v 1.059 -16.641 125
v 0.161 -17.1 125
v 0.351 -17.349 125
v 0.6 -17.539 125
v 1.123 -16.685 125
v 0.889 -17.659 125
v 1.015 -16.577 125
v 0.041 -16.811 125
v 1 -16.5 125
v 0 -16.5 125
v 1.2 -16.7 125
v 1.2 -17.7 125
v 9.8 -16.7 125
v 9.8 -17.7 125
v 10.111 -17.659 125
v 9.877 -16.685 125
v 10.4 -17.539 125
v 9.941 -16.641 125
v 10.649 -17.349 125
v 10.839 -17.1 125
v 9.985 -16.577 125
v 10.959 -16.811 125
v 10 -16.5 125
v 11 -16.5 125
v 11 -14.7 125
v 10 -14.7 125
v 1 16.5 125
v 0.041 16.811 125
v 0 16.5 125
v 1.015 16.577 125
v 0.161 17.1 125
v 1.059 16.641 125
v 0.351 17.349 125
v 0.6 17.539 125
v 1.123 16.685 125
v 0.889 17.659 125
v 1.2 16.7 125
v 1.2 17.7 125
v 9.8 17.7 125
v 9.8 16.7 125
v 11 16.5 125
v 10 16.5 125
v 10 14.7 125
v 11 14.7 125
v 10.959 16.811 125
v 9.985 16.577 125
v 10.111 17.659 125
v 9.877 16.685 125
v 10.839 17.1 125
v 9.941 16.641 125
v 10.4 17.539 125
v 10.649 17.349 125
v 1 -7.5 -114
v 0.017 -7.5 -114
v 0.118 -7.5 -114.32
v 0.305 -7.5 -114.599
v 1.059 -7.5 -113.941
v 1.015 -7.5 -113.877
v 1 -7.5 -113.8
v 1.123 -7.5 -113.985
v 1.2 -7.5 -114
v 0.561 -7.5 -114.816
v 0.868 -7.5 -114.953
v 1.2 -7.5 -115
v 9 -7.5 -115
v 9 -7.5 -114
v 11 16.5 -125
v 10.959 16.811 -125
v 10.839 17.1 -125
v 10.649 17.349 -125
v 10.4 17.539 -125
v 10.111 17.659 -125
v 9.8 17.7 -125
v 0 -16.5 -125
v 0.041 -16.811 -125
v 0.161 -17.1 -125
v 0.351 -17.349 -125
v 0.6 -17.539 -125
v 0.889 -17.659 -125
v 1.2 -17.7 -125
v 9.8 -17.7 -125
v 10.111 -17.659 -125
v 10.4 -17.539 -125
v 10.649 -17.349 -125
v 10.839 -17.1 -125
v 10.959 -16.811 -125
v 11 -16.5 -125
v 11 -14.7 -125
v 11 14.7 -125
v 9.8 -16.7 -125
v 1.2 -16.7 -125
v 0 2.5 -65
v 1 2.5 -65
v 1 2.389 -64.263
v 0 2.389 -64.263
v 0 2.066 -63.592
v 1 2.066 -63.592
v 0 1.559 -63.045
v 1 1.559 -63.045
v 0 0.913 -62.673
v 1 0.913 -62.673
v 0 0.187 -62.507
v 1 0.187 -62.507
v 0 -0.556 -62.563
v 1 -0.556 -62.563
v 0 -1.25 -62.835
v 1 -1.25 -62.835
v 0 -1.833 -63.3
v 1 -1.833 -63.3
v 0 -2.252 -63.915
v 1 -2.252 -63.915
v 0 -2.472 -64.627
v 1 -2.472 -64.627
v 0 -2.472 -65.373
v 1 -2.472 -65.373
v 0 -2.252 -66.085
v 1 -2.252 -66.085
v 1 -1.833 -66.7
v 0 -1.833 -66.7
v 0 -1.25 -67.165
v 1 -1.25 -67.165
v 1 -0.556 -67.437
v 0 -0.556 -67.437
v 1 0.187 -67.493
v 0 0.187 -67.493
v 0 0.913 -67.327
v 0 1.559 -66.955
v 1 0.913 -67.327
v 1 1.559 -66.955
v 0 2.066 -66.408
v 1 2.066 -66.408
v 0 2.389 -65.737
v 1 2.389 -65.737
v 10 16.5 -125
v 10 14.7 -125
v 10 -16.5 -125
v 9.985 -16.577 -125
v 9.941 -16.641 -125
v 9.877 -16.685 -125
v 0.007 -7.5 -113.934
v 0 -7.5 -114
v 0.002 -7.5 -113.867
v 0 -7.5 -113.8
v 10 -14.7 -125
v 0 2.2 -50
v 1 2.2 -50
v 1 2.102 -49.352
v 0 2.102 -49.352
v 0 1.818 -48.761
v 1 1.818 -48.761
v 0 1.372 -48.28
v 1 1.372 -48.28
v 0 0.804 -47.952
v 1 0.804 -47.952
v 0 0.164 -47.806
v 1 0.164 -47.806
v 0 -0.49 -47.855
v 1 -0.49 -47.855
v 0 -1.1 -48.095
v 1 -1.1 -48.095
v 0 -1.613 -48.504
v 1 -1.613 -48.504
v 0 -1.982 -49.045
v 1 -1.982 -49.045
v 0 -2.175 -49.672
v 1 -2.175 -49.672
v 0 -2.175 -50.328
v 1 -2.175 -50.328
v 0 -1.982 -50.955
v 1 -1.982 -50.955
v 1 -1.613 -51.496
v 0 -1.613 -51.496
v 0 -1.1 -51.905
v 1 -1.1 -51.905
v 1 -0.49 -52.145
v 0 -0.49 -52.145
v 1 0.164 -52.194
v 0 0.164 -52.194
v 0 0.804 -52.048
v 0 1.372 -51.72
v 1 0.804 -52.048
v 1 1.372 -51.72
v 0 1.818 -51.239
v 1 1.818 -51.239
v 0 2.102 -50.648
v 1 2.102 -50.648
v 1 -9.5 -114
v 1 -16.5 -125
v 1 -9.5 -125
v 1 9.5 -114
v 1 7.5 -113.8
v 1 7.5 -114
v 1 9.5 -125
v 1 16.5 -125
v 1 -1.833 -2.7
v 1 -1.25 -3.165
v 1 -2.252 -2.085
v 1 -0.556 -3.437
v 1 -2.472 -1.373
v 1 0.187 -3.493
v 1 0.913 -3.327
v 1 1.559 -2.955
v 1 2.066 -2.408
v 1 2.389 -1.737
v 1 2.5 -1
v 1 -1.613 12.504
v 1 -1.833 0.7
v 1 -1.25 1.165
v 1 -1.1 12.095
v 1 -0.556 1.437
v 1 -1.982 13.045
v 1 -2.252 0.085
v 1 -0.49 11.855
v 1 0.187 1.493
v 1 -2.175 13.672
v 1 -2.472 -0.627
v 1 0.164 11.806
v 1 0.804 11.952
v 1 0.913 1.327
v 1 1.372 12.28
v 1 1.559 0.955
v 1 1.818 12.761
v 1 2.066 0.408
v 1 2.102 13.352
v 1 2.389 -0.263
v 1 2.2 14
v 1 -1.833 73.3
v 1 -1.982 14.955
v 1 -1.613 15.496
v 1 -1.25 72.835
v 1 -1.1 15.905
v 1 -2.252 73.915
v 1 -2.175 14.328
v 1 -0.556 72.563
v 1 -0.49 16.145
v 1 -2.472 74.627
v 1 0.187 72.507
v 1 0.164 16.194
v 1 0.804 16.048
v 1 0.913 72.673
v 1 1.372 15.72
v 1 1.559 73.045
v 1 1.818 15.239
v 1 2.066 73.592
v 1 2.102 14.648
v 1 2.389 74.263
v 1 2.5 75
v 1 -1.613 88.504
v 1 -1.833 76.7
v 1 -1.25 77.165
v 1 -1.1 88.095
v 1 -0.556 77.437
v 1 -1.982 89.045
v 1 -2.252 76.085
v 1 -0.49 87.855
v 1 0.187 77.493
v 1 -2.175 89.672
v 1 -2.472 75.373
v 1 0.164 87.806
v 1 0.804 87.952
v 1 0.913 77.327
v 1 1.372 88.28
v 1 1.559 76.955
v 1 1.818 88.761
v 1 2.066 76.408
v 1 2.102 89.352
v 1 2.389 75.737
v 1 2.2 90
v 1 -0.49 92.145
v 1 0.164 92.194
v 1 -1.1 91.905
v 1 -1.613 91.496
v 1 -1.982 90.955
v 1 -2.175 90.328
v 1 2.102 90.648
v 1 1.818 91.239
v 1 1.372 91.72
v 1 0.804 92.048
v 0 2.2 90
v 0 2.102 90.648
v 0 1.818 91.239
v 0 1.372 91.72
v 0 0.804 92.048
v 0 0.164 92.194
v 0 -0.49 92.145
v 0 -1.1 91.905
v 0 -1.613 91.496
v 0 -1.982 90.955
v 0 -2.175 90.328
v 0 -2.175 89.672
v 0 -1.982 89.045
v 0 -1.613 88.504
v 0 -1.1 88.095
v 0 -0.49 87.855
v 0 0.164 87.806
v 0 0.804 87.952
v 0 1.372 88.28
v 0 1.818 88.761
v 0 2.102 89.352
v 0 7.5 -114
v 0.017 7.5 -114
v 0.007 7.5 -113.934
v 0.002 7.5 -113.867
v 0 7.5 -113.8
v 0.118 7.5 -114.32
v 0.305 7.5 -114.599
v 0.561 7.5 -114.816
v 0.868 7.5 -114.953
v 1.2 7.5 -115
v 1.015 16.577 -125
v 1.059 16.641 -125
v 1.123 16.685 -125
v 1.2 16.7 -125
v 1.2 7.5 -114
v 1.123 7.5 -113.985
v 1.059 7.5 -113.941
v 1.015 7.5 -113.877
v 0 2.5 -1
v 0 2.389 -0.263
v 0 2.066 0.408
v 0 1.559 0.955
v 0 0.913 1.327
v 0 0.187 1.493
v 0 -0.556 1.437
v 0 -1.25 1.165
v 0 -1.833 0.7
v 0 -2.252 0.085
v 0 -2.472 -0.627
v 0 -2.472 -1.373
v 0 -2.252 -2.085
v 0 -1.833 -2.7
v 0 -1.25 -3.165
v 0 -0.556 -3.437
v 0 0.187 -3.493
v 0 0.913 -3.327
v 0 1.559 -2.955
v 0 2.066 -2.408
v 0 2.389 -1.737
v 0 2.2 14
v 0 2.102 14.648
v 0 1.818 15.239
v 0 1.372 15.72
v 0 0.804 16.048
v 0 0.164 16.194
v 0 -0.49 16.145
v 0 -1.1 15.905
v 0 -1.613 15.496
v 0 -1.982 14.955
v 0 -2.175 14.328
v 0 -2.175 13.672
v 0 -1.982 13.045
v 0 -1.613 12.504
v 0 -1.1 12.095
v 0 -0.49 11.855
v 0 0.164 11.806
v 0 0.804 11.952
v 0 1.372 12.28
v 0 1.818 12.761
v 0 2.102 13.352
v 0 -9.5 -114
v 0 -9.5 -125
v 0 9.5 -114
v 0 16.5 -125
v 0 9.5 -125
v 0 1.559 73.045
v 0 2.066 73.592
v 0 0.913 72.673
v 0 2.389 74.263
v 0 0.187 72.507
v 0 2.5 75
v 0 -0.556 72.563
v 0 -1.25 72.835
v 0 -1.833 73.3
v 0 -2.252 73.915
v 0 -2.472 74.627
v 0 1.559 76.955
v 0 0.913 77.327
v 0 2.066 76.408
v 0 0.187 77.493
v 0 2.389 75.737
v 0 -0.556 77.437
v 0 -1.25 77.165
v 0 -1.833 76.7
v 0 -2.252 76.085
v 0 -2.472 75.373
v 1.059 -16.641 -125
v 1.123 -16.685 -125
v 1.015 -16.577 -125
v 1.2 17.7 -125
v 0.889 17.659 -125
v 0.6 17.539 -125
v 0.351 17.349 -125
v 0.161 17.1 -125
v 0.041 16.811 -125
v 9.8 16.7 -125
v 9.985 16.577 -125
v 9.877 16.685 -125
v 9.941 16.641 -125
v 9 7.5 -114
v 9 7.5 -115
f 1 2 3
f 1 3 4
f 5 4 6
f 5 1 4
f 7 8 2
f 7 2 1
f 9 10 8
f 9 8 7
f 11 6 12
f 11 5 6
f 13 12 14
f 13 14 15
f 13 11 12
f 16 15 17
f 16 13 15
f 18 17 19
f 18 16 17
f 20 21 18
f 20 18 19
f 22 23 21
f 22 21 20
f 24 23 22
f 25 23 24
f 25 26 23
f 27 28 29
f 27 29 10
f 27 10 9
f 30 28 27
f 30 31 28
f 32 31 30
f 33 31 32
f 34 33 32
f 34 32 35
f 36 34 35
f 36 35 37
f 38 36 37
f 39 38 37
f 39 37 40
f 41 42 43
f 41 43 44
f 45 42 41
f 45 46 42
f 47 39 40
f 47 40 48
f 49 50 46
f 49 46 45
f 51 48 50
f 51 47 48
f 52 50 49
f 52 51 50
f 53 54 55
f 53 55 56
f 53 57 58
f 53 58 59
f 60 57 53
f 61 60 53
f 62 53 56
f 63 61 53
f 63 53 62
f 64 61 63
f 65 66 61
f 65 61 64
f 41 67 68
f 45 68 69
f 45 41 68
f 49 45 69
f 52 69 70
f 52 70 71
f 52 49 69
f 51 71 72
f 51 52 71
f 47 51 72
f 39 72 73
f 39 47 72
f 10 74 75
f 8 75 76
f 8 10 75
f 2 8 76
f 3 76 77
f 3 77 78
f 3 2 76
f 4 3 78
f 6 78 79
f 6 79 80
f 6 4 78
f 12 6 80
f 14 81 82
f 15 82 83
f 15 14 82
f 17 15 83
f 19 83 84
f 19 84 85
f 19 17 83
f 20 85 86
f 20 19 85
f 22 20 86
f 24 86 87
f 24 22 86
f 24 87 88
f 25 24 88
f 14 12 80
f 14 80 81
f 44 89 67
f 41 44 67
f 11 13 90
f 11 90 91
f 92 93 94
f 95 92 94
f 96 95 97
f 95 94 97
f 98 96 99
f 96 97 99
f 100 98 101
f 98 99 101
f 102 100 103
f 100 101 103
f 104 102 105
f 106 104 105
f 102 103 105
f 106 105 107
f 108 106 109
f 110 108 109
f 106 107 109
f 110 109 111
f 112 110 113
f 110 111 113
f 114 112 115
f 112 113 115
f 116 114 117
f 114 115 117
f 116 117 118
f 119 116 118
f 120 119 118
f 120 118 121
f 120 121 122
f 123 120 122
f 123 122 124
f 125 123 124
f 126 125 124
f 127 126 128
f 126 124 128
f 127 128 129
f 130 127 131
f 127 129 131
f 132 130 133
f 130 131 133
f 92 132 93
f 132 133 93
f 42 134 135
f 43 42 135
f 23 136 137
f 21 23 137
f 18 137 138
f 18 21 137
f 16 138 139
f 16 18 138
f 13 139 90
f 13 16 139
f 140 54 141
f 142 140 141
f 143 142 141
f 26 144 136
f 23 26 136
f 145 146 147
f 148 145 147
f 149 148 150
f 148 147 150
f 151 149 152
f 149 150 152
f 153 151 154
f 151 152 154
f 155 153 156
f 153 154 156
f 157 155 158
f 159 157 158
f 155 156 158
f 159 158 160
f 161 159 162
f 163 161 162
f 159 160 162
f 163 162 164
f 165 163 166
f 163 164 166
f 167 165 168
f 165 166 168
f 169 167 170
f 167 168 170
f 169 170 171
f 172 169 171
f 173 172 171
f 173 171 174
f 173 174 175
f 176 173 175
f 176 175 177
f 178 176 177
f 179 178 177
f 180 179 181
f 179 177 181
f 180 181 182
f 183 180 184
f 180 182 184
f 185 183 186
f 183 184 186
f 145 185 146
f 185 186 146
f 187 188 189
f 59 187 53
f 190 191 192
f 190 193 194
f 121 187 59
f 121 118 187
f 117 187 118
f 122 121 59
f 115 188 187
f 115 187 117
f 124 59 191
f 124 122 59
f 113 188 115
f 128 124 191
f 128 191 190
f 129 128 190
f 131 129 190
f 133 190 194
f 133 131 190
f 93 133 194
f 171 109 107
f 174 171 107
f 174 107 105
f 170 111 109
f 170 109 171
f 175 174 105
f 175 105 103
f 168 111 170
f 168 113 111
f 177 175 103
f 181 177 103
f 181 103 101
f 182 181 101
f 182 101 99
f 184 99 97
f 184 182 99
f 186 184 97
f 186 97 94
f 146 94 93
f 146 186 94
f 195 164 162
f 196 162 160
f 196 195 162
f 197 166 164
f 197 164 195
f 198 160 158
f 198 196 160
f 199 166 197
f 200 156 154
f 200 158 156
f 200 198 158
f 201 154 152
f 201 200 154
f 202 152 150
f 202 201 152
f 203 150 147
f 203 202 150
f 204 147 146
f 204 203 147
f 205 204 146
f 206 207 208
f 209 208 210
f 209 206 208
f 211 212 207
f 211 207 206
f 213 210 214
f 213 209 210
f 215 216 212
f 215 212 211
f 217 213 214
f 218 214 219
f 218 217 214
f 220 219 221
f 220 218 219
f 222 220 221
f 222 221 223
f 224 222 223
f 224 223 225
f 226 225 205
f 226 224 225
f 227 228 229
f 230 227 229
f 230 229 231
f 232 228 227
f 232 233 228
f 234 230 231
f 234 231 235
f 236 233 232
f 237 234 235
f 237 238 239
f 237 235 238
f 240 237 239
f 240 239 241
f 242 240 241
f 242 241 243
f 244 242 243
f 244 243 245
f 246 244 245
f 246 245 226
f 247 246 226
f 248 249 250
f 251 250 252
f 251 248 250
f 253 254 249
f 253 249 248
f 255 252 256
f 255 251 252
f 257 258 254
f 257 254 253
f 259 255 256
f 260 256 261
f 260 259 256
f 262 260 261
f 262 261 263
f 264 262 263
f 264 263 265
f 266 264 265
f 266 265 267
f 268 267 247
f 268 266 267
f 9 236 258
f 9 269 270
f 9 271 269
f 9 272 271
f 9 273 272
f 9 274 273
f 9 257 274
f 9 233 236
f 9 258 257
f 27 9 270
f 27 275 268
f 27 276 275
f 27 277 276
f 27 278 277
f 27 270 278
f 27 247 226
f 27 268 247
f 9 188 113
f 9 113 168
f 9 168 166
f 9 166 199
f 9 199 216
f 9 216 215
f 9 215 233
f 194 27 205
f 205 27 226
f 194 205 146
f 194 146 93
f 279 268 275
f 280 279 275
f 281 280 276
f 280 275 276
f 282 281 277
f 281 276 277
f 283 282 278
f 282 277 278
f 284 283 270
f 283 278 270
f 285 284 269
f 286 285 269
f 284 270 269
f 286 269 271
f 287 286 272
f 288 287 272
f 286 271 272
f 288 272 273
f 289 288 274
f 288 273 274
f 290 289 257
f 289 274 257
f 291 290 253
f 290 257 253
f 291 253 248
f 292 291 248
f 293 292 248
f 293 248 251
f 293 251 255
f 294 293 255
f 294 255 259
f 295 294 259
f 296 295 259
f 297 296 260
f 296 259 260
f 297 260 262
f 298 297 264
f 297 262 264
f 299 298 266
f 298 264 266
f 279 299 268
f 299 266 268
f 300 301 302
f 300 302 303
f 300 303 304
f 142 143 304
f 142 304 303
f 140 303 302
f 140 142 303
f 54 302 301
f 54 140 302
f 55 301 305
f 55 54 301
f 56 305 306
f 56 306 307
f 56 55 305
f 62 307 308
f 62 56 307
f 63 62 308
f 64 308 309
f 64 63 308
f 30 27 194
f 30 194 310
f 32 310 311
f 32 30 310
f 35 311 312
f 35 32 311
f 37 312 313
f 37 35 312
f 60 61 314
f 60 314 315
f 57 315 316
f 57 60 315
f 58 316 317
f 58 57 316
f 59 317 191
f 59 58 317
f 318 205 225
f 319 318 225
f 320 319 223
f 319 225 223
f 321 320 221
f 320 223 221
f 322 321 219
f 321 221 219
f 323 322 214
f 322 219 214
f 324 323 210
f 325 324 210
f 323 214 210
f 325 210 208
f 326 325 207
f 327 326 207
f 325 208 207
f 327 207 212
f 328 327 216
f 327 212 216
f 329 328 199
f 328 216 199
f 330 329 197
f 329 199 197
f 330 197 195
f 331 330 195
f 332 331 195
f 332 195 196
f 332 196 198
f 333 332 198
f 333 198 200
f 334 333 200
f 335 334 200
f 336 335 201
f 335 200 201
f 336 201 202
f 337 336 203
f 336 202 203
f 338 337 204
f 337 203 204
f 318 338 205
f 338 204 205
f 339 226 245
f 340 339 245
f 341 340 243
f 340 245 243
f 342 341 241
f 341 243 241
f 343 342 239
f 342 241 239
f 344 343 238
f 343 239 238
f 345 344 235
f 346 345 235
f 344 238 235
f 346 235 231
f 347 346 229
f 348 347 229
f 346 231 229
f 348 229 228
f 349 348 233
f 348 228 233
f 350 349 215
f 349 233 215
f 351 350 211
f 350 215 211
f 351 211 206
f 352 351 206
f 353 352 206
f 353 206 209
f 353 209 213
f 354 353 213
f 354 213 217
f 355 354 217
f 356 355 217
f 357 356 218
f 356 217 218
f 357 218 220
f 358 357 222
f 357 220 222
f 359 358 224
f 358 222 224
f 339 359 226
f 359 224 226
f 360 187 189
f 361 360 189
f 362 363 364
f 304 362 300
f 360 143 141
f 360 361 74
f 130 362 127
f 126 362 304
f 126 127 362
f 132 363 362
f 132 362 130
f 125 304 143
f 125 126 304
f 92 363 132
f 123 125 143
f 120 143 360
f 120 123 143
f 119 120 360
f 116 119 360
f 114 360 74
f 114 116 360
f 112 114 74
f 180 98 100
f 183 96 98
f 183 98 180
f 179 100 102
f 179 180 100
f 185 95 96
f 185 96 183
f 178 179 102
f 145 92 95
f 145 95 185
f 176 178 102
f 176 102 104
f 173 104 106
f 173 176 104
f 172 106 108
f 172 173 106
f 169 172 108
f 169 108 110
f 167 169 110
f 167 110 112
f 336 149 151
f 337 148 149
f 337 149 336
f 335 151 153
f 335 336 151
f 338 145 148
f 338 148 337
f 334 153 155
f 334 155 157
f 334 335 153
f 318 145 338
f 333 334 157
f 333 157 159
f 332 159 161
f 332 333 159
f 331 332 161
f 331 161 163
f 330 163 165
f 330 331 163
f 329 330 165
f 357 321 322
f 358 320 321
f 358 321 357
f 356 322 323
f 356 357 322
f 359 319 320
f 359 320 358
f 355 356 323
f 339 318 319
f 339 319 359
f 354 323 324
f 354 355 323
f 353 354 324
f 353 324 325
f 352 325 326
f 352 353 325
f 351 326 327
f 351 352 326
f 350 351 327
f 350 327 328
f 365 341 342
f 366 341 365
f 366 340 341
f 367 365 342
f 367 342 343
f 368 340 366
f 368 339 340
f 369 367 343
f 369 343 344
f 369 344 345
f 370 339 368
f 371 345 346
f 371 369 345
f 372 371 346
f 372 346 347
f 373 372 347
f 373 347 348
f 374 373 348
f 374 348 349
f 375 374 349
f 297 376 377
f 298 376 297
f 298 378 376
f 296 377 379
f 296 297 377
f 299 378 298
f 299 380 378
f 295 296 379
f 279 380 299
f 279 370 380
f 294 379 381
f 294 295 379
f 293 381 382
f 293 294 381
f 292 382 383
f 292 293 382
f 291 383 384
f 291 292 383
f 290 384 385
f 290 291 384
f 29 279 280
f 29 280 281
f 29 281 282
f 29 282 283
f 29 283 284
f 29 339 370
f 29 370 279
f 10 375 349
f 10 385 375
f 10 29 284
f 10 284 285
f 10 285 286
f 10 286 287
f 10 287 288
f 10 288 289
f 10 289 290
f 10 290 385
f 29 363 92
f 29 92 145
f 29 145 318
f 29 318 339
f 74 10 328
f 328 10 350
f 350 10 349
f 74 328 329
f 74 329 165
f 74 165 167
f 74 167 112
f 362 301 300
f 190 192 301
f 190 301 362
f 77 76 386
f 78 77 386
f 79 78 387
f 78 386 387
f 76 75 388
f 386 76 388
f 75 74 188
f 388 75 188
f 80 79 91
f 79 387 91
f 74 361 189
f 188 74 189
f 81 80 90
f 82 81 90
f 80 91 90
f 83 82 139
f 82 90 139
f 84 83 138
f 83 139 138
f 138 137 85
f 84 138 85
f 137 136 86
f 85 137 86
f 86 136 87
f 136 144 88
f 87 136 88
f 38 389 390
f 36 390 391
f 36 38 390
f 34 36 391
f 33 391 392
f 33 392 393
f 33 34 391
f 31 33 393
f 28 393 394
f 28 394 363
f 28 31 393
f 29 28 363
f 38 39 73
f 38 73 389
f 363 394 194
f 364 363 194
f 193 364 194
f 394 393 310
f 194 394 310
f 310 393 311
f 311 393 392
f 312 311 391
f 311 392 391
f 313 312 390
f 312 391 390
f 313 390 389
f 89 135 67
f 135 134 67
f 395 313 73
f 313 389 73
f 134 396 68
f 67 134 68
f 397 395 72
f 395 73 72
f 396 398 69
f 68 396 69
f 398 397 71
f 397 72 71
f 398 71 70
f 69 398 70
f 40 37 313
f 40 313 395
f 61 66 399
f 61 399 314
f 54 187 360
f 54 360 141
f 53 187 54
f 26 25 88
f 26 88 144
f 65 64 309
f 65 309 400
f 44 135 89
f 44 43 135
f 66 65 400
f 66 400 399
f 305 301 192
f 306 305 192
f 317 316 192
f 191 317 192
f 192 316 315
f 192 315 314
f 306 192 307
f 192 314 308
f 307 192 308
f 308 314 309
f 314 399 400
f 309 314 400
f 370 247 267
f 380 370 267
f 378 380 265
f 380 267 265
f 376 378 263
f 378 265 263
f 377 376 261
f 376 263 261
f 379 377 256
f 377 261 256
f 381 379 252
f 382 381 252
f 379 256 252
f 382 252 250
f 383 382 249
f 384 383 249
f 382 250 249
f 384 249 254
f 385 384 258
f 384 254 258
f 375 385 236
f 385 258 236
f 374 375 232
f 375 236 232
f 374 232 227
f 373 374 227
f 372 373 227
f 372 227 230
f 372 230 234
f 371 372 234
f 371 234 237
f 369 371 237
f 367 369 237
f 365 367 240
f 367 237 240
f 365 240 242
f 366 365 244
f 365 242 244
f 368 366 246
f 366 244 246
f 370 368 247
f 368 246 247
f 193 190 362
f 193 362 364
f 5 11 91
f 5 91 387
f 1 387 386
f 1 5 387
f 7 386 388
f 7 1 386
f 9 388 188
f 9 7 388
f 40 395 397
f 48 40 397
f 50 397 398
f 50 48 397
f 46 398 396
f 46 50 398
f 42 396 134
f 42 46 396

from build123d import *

# Parameters (mm, degrees)
SM_BASE_FLANGE_1_DEPTH           = 125
SKETCH_3_W                       = 11
SKETCH_3_H                       = 19
CUT_EXTRUDE_1_DEPTH              = 1
SM_EDGE_FLANGE_1_STRIP_W         = 4.4
SM_EDGE_FLANGE_1_STRIP_H         = 1
SM_EDGE_FLANGE_1_STRIP_CUT_DEPTH = 15
SM_EDGE_FLANGE_1_DEPTH           = 15
SKETCH_7_R                       = 2.5
SKETCH_7_R_2                     = 2.2
CUT_EXTRUDE_2_DEPTH              = 1
SKETCH_8_R                       = 2.2
SKETCH_8_R_2                     = 2.5
CUT_EXTRUDE_3_DEPTH              = 1


# Sheet-metal steps are written as plain solids
with BuildPart() as part:
    # Sketch 1 → Базовая кромка1 (new, symmetric)
    with BuildSketch(Plane.XY):
        with BuildLine():
            Line((11, 14.7), (11, 16.5))
            ThreePointArc((11, 16.5), (10.648528137, 17.348528137), (9.8, 17.7))
            Line((9.8, 17.7), (1.2, 17.7))
            ThreePointArc((1.2, 17.7), (0.351471863, 17.348528137), (0, 16.5))
            Line((0, 16.5), (0, -16.5))
            ThreePointArc((0, -16.5), (0.351471863, -17.348528137), (1.2, -17.7))
            Line((1.2, -17.7), (9.8, -17.7))
            ThreePointArc((9.8, -17.7), (10.648528137, -17.348528137), (11, -16.5))
            Line((11, -16.5), (11, -14.7))
            Line((11, -14.7), (10, -14.7))
            Line((10, -14.7), (10, -16.5))
            ThreePointArc((10, -16.5), (9.941421356, -16.641421356), (9.8, -16.7))
            Line((9.8, -16.7), (1.2, -16.7))
            ThreePointArc((1.2, -16.7), (1.058578644, -16.641421356), (1, -16.5))
            Line((1, -16.5), (1, 16.5))
            ThreePointArc((1, 16.5), (1.058578644, 16.641421356), (1.2, 16.7))
            Line((1.2, 16.7), (9.8, 16.7))
            ThreePointArc((9.8, 16.7), (9.941421356, 16.641421356), (10, 16.5))
            Line((10, 16.5), (10, 14.7))
            Line((10, 14.7), (11, 14.7))
        make_face()
    extrude(amount=SM_BASE_FLANGE_1_DEPTH, both=True)

    # Эскиз3 → Вытянуть1 (cut)
    with BuildSketch(Plane(origin=(1, 0, 0), x_dir=(0, 0, -1), z_dir=(1, 0, 0))):
        with Locations((119.5, 0)):
            Rectangle(SKETCH_3_W, SKETCH_3_H)
    extrude(amount=-CUT_EXTRUDE_1_DEPTH, mode=Mode.SUBTRACT)

    # Ребро-кромка1 strip (across the edge) → Ребро-кромка1 strip cut (cut)
    with BuildSketch(Plane(origin=(1, -7.5, -114), x_dir=(0, 0, 1), z_dir=(0, 1, 0))):
        with Locations((-2, -0.5)):
            Rectangle(SM_EDGE_FLANGE_1_STRIP_W, SM_EDGE_FLANGE_1_STRIP_H)
    extrude(amount=SM_EDGE_FLANGE_1_STRIP_CUT_DEPTH, mode=Mode.SUBTRACT)

    # Ребро-кромка1 section (across the edge) → Ребро-кромка1 (add)
    with BuildSketch(Plane(origin=(1, -7.5, -114), x_dir=(0, 0, 1), z_dir=(0, 1, 0))):
        with BuildLine():
            Line((-1, 0.2), (-1, 8))
            Line((-1, 8), (0, 8))
            Line((0, 8), (0, 0.2))
            ThreePointArc((0, 0.2), (0.058578644, 0.058578644), (0.2, 0))
            Line((0.2, 0), (0.2, -1))
            ThreePointArc((0.2, -1), (-0.648528137, -0.648528137), (-1, 0.2))
        make_face()
    extrude(amount=SM_EDGE_FLANGE_1_DEPTH)

    # Эскиз7 → Вытянуть2 (cut)
    with BuildSketch(Plane(origin=(1, 0, 0), x_dir=(0, 0, -1), z_dir=(1, 0, 0))):
        with Locations(Location((65, 0, 0), (0, 0, 90))):
            Circle(SKETCH_7_R)
        with Locations(Location((50, 0, 0), (0, 0, 90))):
            Circle(SKETCH_7_R_2)
        with Locations(Location((1, 0, 0), (0, 0, 90))):
            Circle(SKETCH_7_R)
        with Locations(Location((-14, 0, 0), (0, 0, 90))):
            Circle(SKETCH_7_R_2)
    extrude(amount=-CUT_EXTRUDE_2_DEPTH, mode=Mode.SUBTRACT)

    # Эскиз8 → Вытянуть3 (cut)
    with BuildSketch(Plane(origin=(1, 0, 0), x_dir=(0, 0, -1), z_dir=(1, 0, 0))):
        with Locations(Location((-90, 0, 0), (0, 0, 90))):
            Circle(SKETCH_8_R)
        with Locations(Location((-75, 0, 0), (0, 0, 90))):
            Circle(SKETCH_8_R_2)
    extrude(amount=-CUT_EXTRUDE_3_DEPTH, mode=Mode.SUBTRACT)


solid = part.part
